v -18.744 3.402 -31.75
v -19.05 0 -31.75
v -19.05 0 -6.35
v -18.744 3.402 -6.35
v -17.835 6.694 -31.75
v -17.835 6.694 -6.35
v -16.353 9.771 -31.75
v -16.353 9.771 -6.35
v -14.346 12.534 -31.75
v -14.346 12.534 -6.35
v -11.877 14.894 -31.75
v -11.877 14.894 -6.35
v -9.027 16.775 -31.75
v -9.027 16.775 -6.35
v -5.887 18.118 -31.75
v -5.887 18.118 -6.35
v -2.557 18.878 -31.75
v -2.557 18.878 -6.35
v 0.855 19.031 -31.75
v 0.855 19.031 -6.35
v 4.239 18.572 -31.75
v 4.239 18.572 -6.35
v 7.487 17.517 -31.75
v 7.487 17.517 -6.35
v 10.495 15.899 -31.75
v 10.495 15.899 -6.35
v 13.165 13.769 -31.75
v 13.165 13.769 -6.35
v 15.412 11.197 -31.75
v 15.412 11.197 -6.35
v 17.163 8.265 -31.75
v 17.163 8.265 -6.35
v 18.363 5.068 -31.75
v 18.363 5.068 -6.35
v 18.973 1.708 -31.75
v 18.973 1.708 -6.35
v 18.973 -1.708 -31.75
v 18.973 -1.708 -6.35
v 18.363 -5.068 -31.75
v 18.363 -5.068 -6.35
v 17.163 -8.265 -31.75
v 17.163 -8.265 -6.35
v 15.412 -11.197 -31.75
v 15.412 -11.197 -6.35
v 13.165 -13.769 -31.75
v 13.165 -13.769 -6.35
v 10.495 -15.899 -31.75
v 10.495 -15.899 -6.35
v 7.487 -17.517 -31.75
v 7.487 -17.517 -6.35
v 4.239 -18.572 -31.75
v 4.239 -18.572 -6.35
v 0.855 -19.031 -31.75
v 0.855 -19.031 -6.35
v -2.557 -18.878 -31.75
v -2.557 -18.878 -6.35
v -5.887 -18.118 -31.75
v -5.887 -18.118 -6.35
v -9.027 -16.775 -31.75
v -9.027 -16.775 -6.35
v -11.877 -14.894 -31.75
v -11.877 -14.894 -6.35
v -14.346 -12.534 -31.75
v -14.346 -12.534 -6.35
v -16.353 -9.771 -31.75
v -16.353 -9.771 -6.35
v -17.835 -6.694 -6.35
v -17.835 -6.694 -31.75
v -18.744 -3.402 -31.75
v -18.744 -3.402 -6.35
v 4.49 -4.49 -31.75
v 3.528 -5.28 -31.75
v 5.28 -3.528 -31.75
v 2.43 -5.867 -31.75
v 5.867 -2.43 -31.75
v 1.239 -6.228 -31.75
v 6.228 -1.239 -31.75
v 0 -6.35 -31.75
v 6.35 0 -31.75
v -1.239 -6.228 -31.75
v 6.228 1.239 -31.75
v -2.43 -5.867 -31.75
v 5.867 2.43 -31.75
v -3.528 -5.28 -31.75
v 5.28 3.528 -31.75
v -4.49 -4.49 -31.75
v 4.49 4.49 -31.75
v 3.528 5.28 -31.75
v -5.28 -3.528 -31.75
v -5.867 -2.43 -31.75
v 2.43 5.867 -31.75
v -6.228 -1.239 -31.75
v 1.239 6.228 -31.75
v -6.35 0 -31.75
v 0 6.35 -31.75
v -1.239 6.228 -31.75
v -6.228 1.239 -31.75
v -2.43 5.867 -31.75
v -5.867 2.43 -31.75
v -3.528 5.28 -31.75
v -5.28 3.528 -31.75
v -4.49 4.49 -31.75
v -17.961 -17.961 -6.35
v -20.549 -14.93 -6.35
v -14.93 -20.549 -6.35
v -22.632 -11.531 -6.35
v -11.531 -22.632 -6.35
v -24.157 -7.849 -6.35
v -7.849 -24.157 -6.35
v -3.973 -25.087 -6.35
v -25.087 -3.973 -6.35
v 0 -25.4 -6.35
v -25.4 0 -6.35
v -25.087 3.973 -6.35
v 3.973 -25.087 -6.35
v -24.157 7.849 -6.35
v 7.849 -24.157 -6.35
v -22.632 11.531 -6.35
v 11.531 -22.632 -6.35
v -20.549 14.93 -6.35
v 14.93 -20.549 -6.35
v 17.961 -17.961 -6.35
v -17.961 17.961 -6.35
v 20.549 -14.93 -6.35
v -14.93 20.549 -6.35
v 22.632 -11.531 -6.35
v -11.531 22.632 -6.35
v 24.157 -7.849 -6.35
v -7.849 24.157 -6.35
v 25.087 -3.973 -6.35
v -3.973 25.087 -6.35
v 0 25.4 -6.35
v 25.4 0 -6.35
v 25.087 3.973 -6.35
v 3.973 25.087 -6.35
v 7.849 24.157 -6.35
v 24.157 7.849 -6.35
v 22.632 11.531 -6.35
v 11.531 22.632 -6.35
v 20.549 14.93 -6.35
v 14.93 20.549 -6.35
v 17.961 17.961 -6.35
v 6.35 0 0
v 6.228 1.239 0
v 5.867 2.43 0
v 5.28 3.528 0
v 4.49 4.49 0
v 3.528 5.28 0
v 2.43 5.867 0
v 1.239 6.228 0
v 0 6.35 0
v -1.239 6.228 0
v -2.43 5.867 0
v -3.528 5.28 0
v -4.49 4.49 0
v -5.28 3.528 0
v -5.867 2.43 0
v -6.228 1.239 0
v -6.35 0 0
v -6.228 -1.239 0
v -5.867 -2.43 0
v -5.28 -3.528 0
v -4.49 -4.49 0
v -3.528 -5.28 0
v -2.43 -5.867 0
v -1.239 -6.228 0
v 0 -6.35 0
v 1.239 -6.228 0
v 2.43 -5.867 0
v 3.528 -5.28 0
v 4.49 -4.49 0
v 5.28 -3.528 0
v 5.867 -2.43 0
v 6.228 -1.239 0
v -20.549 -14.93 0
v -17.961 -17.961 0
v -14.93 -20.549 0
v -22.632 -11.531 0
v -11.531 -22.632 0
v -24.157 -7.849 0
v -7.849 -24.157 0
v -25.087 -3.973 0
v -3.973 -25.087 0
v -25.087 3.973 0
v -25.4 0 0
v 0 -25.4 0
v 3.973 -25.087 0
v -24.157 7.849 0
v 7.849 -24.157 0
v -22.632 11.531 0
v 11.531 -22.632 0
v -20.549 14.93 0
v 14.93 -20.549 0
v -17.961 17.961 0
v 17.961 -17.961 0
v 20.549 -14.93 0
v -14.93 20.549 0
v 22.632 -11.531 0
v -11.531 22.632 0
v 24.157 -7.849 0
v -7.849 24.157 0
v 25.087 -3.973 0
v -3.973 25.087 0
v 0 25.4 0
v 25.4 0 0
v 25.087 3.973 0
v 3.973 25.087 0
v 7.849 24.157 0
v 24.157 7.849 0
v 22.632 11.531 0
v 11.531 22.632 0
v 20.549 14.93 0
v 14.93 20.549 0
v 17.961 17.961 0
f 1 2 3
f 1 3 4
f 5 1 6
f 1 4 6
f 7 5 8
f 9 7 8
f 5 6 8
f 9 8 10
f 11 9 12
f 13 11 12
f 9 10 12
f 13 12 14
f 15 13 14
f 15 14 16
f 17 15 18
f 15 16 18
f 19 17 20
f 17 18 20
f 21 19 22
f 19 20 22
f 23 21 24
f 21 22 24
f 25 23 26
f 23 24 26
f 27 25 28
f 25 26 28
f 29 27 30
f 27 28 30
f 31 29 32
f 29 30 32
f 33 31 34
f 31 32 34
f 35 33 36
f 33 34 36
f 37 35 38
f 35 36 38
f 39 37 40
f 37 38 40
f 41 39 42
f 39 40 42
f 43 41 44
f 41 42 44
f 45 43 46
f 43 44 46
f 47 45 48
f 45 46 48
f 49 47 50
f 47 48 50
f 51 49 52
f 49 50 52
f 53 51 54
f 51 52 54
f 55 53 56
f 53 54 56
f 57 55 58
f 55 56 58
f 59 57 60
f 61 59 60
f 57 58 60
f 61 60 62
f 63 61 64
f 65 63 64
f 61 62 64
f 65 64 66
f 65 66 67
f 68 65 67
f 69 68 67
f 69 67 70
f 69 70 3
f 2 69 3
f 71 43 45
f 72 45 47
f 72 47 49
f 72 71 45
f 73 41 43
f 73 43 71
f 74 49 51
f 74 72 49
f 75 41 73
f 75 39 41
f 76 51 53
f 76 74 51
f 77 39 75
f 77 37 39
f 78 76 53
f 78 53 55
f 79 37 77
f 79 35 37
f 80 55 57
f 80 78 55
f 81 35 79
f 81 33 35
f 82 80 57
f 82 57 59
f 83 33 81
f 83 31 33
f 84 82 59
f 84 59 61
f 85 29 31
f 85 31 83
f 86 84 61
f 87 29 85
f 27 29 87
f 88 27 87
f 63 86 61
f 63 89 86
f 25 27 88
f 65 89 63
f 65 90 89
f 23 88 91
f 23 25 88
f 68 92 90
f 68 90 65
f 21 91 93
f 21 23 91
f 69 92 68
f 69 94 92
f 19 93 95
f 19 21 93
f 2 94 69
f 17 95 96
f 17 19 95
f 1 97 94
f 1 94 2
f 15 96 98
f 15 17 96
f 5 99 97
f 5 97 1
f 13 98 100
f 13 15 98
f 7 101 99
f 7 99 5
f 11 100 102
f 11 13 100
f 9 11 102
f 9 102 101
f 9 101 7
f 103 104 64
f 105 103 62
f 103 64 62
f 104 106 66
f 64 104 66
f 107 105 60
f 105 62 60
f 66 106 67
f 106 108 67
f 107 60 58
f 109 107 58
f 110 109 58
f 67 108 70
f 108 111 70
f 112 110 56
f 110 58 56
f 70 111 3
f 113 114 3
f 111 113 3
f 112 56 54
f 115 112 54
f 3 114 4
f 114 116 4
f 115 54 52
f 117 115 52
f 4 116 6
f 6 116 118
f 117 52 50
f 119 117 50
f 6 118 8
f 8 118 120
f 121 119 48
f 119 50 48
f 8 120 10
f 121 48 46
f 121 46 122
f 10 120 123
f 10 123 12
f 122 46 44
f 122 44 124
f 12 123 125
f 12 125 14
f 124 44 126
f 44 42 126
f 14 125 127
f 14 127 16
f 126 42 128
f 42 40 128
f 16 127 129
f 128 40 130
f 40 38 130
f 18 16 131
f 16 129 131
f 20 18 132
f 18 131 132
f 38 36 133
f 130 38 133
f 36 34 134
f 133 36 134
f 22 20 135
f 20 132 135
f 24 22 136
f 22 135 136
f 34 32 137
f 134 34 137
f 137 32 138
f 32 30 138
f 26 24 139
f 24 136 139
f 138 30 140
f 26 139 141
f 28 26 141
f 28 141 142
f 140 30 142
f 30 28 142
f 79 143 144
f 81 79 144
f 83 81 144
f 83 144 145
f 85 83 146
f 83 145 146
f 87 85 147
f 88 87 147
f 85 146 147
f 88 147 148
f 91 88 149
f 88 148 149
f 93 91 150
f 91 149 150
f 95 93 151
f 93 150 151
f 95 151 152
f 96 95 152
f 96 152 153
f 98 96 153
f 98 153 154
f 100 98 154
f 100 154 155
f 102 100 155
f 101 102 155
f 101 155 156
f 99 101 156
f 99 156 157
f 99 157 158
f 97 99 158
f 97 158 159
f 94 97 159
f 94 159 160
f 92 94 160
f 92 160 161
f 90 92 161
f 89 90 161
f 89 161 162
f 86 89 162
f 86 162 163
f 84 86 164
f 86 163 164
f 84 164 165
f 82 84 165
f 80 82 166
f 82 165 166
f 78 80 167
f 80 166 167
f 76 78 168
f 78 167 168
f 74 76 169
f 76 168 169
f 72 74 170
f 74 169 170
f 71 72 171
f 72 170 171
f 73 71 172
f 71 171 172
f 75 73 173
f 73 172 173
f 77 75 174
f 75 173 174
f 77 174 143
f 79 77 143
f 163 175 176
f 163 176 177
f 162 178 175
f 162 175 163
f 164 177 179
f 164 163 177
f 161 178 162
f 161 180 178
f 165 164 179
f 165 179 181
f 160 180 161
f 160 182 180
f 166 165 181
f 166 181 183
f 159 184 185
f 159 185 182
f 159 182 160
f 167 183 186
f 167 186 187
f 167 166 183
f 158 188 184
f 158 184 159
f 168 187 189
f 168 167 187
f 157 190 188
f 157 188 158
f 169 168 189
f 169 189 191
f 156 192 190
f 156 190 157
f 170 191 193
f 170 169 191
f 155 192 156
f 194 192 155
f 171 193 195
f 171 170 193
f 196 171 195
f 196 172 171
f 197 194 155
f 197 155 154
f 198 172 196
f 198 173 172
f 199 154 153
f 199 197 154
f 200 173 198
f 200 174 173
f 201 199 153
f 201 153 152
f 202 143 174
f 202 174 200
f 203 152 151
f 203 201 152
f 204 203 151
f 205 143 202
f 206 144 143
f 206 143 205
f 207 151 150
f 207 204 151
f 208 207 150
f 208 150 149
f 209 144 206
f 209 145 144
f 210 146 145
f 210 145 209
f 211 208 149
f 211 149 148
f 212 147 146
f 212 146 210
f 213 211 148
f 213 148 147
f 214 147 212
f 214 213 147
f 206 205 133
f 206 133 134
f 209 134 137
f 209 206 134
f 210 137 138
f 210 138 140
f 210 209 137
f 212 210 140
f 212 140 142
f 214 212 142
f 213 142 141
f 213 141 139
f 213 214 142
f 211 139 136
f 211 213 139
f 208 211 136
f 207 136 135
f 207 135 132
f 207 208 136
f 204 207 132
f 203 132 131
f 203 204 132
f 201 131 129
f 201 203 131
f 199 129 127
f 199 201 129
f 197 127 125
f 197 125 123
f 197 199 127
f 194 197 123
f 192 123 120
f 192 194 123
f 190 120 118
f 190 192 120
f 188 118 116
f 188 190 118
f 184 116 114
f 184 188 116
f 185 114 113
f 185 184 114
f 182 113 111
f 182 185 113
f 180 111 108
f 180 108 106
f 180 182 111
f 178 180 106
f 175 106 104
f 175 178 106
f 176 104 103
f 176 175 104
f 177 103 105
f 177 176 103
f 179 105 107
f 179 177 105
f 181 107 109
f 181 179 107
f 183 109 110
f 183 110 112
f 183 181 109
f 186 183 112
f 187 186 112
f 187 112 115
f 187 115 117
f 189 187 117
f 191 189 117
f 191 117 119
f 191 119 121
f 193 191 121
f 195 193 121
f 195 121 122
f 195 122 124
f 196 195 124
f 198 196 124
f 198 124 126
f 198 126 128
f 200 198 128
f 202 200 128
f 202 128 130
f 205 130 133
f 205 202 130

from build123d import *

# Parameters (mm, degrees)
SKETCH1_R           = 25.4
BOSS_EXTRUDE2_DEPTH = 6.35
SKETCH2_R           = 19.05
BOSS_EXTRUDE3_DEPTH = 25.4
SKETCH3_R           = 6.35
CUT_EXTRUDE2_DEPTH  = 48.941448664


with BuildPart() as part:
    # Sketch1 → Boss-Extrude2 (new body)
    with BuildSketch(Plane.XY):
        Circle(SKETCH1_R)
    extrude(amount=-BOSS_EXTRUDE2_DEPTH)

    # Sketch2 → Boss-Extrude3 (add)
    with BuildSketch(Plane(origin=(0, 0, -6.35), x_dir=(-1, 0, 0), z_dir=(0, 0, -1))):
        Circle(SKETCH2_R)
    extrude(amount=BOSS_EXTRUDE3_DEPTH)

    # Sketch3 → Cut-Extrude2 (cut, through all)
    with BuildSketch(Plane.XY):
        Circle(SKETCH3_R)
    extrude(amount=-CUT_EXTRUDE2_DEPTH, mode=Mode.SUBTRACT)


solid = part.part
